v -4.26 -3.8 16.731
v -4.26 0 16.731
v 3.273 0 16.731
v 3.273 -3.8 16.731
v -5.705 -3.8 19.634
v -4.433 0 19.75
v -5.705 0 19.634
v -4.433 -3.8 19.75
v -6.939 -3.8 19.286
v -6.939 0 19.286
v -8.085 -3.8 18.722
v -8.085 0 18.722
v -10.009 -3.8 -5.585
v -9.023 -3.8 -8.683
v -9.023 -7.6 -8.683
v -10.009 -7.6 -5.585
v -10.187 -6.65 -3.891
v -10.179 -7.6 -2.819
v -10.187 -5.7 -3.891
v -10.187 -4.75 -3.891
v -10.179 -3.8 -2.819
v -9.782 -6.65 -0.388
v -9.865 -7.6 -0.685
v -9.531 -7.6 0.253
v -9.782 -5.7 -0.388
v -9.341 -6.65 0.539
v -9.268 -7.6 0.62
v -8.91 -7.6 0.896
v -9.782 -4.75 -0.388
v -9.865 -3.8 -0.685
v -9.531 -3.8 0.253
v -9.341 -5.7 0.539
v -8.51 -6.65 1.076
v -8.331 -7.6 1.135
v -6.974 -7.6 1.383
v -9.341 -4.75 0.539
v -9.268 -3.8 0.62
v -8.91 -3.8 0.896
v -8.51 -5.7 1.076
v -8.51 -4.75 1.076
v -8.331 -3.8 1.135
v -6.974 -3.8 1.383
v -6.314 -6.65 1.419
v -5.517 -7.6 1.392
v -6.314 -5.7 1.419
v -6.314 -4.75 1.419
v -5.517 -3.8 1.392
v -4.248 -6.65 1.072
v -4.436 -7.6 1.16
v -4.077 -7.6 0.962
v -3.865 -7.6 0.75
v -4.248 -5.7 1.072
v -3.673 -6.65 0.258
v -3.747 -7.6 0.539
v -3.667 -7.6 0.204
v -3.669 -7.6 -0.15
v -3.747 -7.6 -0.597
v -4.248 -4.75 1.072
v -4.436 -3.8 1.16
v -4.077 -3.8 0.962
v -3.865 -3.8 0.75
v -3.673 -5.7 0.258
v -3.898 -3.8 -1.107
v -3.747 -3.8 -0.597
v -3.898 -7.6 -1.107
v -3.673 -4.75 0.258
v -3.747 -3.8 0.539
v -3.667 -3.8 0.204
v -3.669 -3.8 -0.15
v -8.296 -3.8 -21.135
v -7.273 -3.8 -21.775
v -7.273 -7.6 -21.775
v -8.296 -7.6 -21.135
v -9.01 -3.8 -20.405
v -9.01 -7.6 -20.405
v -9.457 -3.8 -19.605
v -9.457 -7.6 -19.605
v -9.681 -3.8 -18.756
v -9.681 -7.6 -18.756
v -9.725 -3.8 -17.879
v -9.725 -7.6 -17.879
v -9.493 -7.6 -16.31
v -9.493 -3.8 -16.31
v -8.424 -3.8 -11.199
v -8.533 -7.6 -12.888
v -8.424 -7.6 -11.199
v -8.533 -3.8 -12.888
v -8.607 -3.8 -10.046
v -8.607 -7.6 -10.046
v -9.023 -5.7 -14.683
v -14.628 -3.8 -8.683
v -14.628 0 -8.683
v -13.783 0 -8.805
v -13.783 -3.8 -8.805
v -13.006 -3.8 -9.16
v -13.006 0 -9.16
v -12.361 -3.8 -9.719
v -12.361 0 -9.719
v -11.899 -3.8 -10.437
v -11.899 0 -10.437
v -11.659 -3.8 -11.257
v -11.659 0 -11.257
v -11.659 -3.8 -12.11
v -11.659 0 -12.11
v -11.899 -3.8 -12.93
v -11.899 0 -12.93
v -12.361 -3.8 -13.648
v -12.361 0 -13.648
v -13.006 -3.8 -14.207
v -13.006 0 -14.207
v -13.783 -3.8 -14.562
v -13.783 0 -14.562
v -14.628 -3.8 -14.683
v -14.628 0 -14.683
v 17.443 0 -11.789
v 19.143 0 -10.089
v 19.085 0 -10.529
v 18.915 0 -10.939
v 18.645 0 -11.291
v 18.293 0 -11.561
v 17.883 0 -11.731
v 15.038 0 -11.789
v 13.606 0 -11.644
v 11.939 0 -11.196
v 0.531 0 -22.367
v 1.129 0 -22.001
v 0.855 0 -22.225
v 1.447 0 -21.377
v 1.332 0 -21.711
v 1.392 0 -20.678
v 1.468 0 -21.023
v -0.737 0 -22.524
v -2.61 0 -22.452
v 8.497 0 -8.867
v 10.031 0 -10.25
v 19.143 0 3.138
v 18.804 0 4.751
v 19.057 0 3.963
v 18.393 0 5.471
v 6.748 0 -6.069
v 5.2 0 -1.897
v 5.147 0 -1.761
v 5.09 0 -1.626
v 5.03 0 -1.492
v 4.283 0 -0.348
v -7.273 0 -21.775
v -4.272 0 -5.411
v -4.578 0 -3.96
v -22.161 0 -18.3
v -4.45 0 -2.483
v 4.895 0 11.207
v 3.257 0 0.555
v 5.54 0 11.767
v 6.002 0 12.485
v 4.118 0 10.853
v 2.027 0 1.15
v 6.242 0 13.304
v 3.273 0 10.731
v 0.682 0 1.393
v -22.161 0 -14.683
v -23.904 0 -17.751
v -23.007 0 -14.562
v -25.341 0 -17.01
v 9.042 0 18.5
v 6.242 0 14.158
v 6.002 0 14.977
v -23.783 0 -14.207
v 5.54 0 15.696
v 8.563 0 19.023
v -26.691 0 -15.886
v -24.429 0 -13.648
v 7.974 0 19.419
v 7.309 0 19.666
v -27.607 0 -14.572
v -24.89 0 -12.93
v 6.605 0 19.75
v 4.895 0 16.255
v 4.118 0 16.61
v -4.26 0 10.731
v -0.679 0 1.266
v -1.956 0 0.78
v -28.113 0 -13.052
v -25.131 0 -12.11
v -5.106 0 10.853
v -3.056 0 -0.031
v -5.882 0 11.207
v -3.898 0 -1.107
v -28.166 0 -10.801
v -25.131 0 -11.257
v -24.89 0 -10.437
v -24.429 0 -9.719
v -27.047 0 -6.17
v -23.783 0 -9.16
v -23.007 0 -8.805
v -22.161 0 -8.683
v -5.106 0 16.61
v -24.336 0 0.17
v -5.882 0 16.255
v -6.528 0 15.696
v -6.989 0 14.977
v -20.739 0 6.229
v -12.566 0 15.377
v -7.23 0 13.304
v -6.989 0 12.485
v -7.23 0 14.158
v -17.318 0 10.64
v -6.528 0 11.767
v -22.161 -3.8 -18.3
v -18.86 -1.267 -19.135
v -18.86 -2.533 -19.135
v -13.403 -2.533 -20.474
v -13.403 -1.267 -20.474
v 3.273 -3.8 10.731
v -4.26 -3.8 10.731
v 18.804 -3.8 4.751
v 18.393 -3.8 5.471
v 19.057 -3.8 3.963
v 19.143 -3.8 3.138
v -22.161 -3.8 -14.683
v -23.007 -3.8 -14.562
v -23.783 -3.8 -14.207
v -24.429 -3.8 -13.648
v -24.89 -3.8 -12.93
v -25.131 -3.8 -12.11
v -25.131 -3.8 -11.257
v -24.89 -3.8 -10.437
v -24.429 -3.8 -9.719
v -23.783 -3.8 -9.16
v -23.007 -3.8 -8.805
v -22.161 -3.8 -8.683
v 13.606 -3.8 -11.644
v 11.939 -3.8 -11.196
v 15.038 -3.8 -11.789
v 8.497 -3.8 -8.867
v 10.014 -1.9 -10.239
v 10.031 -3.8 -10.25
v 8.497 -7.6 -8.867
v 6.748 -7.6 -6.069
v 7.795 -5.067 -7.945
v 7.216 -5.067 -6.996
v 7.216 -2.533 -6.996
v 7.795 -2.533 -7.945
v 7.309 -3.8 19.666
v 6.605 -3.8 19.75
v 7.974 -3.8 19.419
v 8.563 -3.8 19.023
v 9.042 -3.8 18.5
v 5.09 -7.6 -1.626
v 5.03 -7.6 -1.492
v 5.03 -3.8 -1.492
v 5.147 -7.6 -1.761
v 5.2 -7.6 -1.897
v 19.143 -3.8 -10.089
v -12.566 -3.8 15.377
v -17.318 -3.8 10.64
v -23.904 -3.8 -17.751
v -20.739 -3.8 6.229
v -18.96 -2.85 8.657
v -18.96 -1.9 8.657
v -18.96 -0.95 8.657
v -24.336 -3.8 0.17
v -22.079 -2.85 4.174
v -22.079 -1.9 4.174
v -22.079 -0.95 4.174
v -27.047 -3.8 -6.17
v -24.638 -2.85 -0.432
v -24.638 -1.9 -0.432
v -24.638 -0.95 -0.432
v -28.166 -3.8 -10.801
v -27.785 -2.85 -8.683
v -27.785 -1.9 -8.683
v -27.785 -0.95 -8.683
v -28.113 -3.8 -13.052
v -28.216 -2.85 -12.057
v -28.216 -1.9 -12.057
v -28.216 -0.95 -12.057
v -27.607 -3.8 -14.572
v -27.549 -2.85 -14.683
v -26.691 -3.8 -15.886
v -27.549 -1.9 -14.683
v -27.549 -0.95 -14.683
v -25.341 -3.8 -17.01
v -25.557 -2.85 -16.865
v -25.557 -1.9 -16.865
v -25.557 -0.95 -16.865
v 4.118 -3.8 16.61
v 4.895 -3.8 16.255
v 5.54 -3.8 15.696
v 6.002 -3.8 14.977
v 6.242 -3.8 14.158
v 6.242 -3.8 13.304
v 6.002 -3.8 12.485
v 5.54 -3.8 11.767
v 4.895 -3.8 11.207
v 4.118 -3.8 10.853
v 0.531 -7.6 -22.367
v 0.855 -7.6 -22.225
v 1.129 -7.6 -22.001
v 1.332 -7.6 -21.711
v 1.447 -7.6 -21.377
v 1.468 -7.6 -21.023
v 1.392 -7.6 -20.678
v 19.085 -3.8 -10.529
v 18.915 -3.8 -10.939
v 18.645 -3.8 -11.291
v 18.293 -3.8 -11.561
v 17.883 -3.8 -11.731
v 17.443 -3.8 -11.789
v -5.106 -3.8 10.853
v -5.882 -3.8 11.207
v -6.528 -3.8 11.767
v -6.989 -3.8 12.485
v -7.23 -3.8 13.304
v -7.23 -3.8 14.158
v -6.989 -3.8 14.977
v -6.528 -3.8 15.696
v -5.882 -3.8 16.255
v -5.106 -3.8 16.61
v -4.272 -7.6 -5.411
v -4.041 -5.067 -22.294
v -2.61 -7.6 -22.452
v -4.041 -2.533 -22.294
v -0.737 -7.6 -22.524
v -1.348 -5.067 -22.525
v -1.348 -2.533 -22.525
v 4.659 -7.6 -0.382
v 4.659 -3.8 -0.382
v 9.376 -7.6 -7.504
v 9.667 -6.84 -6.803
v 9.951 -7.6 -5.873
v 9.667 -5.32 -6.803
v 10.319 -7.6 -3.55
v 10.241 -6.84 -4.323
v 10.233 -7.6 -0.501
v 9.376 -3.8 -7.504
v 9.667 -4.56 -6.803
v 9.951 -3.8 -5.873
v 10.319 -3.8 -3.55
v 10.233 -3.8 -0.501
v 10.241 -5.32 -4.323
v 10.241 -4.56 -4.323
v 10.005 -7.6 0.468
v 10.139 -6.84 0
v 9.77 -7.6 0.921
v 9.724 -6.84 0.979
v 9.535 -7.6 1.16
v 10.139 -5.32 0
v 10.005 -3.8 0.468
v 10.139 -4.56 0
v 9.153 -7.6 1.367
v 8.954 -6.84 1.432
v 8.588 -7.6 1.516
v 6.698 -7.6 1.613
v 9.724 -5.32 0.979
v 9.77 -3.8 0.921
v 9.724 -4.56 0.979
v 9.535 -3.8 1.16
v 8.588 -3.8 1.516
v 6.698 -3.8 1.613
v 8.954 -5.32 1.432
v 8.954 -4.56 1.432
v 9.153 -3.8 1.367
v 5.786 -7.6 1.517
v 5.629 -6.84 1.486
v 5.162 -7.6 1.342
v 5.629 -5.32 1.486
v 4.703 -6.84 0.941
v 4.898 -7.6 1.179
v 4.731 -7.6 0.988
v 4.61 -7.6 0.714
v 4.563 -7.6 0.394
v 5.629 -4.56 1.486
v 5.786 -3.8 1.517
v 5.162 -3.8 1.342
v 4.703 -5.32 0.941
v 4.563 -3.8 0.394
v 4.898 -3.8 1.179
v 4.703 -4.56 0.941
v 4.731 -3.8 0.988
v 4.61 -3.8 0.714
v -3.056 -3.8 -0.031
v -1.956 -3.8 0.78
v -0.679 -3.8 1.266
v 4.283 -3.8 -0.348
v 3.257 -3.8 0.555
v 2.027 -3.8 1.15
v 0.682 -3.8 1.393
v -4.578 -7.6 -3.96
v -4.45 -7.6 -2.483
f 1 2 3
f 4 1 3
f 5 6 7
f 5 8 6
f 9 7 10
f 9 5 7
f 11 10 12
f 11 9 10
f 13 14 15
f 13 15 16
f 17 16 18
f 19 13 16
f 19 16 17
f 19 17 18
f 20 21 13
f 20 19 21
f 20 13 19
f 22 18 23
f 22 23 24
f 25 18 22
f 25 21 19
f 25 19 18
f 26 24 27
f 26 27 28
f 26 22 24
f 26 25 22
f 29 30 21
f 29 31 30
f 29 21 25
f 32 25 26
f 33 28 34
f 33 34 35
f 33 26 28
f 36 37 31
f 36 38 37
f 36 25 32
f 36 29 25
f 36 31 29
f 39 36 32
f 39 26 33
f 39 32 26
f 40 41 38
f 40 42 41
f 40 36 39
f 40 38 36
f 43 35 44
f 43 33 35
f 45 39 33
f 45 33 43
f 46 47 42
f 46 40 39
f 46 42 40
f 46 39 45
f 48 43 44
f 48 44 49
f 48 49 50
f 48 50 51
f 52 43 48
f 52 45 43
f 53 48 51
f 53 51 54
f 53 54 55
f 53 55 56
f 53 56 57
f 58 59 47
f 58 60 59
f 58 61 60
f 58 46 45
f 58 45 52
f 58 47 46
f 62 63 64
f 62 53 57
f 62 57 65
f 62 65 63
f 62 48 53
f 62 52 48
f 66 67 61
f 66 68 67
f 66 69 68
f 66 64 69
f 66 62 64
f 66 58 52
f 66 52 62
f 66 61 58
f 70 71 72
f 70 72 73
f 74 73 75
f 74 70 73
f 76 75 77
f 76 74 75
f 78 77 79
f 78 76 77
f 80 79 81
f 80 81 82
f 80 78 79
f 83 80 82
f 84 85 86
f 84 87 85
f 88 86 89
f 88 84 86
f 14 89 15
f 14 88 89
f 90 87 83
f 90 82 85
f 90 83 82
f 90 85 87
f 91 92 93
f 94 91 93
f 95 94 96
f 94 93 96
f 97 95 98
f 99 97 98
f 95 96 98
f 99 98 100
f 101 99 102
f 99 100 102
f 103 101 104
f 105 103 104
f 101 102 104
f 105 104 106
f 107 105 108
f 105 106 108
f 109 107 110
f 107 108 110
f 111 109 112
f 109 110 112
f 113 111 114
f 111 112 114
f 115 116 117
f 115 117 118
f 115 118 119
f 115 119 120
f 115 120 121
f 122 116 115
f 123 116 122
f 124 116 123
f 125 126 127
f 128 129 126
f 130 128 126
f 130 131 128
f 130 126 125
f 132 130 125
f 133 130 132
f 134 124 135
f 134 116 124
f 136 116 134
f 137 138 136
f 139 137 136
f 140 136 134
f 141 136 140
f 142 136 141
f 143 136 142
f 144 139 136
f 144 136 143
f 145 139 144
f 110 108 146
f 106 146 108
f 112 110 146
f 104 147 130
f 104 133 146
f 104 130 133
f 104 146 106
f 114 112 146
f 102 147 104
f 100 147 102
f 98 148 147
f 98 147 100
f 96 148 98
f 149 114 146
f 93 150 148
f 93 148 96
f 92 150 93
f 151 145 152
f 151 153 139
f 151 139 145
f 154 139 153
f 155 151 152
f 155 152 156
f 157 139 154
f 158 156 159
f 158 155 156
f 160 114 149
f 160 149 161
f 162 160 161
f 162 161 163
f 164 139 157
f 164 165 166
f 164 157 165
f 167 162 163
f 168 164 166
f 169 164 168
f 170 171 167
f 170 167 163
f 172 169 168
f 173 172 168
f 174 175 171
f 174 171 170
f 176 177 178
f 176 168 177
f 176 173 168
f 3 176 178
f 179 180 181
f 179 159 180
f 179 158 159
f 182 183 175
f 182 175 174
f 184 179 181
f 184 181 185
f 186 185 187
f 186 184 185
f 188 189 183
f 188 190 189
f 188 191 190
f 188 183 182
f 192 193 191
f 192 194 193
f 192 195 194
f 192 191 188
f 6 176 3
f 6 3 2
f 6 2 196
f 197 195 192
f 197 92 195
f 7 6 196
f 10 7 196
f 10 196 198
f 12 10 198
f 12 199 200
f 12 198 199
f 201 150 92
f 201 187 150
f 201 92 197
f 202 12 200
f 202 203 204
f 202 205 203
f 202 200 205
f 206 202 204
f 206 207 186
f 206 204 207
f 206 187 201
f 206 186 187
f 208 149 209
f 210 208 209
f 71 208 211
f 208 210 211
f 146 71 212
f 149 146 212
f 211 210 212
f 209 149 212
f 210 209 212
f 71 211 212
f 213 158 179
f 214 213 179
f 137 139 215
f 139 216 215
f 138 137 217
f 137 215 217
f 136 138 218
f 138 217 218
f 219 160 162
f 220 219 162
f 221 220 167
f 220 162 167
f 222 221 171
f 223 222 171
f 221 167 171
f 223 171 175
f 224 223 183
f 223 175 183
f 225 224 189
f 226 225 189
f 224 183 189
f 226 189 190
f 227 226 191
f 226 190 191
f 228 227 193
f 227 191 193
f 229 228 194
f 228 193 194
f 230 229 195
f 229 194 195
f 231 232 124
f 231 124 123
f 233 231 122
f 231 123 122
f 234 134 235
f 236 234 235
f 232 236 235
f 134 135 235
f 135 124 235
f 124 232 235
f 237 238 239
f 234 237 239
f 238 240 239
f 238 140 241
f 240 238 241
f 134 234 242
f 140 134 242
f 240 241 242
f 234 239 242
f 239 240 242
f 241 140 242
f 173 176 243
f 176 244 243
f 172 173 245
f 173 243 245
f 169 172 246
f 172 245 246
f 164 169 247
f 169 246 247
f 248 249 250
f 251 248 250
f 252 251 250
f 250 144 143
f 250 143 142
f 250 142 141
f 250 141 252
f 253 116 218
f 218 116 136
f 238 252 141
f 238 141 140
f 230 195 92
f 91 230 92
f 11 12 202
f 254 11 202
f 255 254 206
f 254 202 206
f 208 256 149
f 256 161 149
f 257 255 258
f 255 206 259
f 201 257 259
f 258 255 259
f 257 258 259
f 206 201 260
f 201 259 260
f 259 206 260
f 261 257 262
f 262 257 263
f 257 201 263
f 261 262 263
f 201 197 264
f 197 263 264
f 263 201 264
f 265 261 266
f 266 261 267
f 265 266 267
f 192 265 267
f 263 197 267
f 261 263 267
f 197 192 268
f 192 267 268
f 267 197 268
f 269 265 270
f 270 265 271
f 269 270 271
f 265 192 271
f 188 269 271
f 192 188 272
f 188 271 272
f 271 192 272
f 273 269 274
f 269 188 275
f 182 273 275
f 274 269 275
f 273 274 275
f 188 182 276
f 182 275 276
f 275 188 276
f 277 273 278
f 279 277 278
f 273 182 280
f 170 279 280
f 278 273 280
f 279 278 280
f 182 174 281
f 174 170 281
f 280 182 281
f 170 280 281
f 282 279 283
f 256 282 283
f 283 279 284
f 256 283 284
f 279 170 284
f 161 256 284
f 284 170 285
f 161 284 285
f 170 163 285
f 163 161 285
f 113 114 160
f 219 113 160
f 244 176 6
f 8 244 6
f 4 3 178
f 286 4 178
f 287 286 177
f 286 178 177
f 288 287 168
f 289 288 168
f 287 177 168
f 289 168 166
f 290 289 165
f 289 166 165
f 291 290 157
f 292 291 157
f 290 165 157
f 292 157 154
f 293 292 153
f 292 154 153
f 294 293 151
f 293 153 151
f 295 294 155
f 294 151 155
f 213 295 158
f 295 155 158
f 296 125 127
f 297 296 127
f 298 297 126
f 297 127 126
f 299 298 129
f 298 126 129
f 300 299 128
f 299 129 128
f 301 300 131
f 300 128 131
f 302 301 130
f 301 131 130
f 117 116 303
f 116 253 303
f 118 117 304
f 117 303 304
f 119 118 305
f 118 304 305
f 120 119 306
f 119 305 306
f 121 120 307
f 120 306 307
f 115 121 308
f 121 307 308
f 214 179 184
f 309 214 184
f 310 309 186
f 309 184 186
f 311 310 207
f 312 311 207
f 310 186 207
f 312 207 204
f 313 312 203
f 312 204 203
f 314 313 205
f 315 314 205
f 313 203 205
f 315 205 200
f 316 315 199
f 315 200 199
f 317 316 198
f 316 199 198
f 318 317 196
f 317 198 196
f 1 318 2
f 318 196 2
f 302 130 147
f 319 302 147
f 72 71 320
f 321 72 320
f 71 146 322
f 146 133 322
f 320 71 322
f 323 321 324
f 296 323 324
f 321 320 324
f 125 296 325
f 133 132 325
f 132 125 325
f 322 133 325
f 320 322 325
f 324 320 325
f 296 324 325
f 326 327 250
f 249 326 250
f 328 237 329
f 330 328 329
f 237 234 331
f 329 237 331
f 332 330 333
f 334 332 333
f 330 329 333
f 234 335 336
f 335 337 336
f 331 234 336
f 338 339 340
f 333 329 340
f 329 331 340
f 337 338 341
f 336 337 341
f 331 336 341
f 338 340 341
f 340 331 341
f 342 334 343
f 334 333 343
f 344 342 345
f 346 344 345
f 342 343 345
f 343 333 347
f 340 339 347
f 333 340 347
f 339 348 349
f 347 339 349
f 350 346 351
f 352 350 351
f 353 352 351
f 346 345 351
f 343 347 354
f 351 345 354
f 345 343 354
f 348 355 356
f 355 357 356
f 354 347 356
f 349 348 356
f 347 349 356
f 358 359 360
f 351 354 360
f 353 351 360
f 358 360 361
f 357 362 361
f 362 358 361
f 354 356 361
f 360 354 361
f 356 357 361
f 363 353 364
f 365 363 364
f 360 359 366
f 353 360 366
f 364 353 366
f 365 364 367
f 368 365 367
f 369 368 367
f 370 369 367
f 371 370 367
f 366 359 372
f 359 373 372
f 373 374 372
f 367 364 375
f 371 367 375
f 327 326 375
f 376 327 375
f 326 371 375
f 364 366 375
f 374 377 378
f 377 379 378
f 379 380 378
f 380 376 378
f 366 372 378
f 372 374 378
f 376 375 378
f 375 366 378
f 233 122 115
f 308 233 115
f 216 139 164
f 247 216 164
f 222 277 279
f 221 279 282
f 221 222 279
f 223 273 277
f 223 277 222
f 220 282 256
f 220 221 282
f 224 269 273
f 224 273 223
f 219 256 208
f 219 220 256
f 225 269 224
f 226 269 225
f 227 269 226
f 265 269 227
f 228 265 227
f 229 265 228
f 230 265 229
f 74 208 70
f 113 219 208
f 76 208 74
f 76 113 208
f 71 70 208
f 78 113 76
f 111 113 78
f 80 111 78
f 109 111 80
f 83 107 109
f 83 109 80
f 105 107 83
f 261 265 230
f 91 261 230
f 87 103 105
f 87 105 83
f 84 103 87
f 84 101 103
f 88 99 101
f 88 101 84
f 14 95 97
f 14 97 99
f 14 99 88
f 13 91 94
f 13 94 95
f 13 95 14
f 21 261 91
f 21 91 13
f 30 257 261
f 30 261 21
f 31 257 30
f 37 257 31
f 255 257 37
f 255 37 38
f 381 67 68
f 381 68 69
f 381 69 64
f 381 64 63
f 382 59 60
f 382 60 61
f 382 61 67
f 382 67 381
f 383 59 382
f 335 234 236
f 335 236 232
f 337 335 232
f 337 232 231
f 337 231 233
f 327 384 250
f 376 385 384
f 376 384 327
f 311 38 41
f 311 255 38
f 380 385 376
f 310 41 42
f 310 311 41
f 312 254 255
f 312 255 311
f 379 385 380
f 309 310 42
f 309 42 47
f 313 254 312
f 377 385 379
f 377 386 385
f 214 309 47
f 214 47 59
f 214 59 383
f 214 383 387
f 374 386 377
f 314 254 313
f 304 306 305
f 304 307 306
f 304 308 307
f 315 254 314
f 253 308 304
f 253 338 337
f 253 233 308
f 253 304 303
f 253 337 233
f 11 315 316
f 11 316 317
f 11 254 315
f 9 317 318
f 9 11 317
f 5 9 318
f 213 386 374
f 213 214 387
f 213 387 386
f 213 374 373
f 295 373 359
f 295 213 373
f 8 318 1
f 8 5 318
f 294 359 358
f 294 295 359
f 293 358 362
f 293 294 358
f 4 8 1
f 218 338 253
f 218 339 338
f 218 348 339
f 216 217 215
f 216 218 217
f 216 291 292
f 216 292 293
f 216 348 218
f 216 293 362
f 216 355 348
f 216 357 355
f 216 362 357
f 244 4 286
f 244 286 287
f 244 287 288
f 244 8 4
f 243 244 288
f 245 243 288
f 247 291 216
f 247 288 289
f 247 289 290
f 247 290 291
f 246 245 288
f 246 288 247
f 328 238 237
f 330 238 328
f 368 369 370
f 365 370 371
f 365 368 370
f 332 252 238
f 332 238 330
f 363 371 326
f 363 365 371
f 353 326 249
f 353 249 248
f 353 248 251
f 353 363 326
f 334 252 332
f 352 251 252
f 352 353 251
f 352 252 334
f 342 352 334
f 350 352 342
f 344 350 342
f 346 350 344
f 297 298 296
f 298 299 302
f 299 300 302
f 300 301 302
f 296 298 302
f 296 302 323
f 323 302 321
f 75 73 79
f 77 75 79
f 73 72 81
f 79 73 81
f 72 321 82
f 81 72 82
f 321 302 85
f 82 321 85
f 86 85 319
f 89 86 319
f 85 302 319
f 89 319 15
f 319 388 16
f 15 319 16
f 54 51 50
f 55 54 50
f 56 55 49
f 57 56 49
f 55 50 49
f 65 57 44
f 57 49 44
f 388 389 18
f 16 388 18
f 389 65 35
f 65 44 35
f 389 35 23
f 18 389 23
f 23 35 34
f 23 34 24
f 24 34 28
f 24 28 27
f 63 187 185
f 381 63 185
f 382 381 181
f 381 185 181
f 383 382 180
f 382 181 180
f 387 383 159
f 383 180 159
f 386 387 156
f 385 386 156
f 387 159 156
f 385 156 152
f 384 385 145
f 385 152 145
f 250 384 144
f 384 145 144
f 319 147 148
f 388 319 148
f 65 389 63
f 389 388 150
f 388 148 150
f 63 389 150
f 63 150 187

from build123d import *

# Parameters (mm, degrees)
F1_DEPTH = 3.8
F2_DEPTH = 7.6
F3_R     = 7
F4_R     = 3
F5_R     = 4
F6_R     = 1.7


with BuildPart() as f1:
    # F0 (on Front) → F1 (new body)
    with BuildSketch(Plane.XZ):
        with BuildLine():
            Line((19.1431716898, 4.4253403938), (8.1440456616, 19.750261103))
            Line((8.1440456616, 19.750261103), (-6.1453692615, 19.750261103))
            add(Edge.make_bspline(
                [(-6.1453692615, 19.750261103), (-9.4334975883, 18.3276780648), (-20.4694799737, 9.4077816301), (-28.441204782, -7.9211202874), (-28.3713925064, -15.033986271), (-24.9090821352, -17.6588842502), (-22.1613161266, -18.3001520287)],
                knots=[0, 0, 0, 0, 0.3043807241, 0.630499808, 0.8116691041, 1, 1, 1, 1], degree=3))
            add(Edge.make_bspline(
                [(-22.1613161266, -18.3001520287), (-20.4320557503, -18.7037231321), (-13.2463438928, -20.672034694), (-7.2728786379, -21.7751605126)],
                knots=[0, 0, 0, 0, 14.676670933, 14.676670933, 14.676670933, 14.676670933], degree=3))
            add(Edge.make_bspline(
                [(-7.2728786379, -21.7751605126), (-10.7580149359, -20.0565494265), (-8.7832123206, -14.063103822), (-8.03378309, -11.3945532964), (-9.0233562514, -8.6834942922)],
                knots=[0, 0, 0, 0, 0.5245717937, 1, 1, 1, 1], degree=3))
            add(Edge.make_bspline(
                [(-9.0233562514, -8.6834942922), (-10.6191516402, -5.3268720907), (-10.1119981872, -0.4332128436), (-8.8609410373, 1.4029428946), (-3.6260034076, 1.6703835883), (-3.5176839858, 0), (-3.8980361515, -1.1065827018)],
                knots=[0, 0, 0, 0, 0.3686579414, 0.5465668413, 0.8102724675, 1, 1, 1, 1], degree=3))
            ThreePointArc((-3.8980361515, -1.1065827018), (0.6821136218, 1.3926973088), (5.0296685697, -1.4922530361))
            add(Edge.make_bspline(
                [(8.4968951944, -8.8667105614), (10.512974474, -6.6020334922), (10.6178822415, 0.1333355699), (9.2147437469, 1.7017312358), (5.6166367294, 1.6619292411), (4.4507364715, 0.9827180402), (4.4928646091, -0.16227164), (5.0296685697, -1.4922530361)],
                knots=[0, 0, 0, 0, 0.3364900582, 0.4892530829, 0.6935980051, 0.8097848409, 0.9832063696, 0.9832063696, 0.9832063696, 0.9832063696], degree=3))
            add(Edge.make_bspline(
                [(8.4968951944, -8.8667105614), (8.93450925, -9.375769436), (10.8149022533, -11.1384536985), (13.7340780615, -11.7891050671), (15.0382904123, -11.7891050671)],
                knots=[0.3188114686, 0.3188114686, 0.3188114686, 0.3188114686, 0.5009211334, 1, 1, 1, 1], degree=3))
            Line((15.0382904123, -11.7891050671), (19.1431716898, -11.7891050671))
            Line((19.1431716898, -11.7891050671), (19.1431716898, 4.4253403938))
        make_face()
        with BuildLine():
            ThreePointArc((-22.1613161266, -14.6834942922), (-25.1613161266, -11.6834942922), (-22.1613161266, -8.6834942922))
            Line((-22.1613161266, -8.6834942922), (-14.628011294, -8.6834942922))
            ThreePointArc((-14.628011294, -8.6834942922), (-11.628011294, -11.6834942922), (-14.628011294, -14.6834942922))
            Line((-14.628011294, -14.6834942922), (-22.1613161266, -14.6834942922))
        make_face(mode=Mode.SUBTRACT)
        with BuildLine():
            ThreePointArc((3.2729445693, 16.7312547565), (6.2729445693, 13.7312547565), (3.2729445693, 10.7312547565))
            Line((3.2729445693, 10.7312547565), (-4.2603602633, 10.7312547565))
            ThreePointArc((-4.2603602633, 10.7312547565), (-7.2603602633, 13.7312547565), (-4.2603602633, 16.7312547565))
            Line((-4.2603602633, 16.7312547565), (3.2729445693, 16.7312547565))
        make_face(mode=Mode.SUBTRACT)
    extrude(amount=F1_DEPTH)

    # F0 (on Front) → F2 (join)
    with BuildSketch(Plane.XZ):
        with BuildLine():
            add(Edge.make_bspline(
                [(-7.2728786379, -21.7751605126), (-10.7580149359, -20.0565494265), (-8.7832123206, -14.063103822), (-8.03378309, -11.3945532964), (-9.0233562514, -8.6834942922)],
                knots=[0, 0, 0, 0, 0.5245717937, 1, 1, 1, 1], degree=3))
            add(Edge.make_bspline(
                [(-7.2728786379, -21.7751605126), (-3.8634845801, -22.4047767321), (-0.848995576, -22.7525474742), (0.5306684761, -22.3666733306)],
                knots=[14.676670933, 14.676670933, 14.676670933, 14.676670933, 23.053476109, 23.053476109, 23.053476109, 23.053476109], degree=3))
            ThreePointArc((0.5306684761, -22.3666733306), (1.3315647917, -21.7109648486), (1.3916492908, -20.6776312264))
            Line((1.3916492908, -20.6776312264), (-4.2720503639, -5.4112309833))
            ThreePointArc((-4.2720503639, -5.4112309833), (-4.5685146727, -3.2168998843), (-3.8980361515, -1.1065827018))
            add(Edge.make_bspline(
                [(-9.0233562514, -8.6834942922), (-10.6191516402, -5.3268720907), (-10.1119981872, -0.4332128436), (-8.8609410373, 1.4029428946), (-3.6260034076, 1.6703835883), (-3.5176839858, 0), (-3.8980361515, -1.1065827018)],
                knots=[0, 0, 0, 0, 0.3686579414, 0.5465668413, 0.8102724675, 1, 1, 1, 1], degree=3))
        make_face()
        with BuildLine():
            add(Edge.make_bspline(
                [(6.7479446556, -6.068916612), (7.1641658841, -6.9684223917), (7.730783303, -7.9755233328), (8.4968951944, -8.8667105614)],
                knots=[0, 0, 0, 0, 0.3188114686, 0.3188114686, 0.3188114686, 0.3188114686], degree=3))
            add(Edge.make_bspline(
                [(8.4968951944, -8.8667105614), (10.512974474, -6.6020334922), (10.6178822415, 0.1333355699), (9.2147437469, 1.7017312358), (5.6166367294, 1.6619292411), (4.4507364715, 0.9827180402), (4.4928646091, -0.16227164), (5.0296685697, -1.4922530361)],
                knots=[0, 0, 0, 0, 0.3364900582, 0.4892530829, 0.6935980051, 0.8097848409, 0.9832063696, 0.9832063696, 0.9832063696, 0.9832063696], degree=3))
            ThreePointArc((5.0296685697, -1.4922530361), (5.1193553392, -1.6928196399), (5.2002361796, -1.8970963366))
            Line((5.2002361796, -1.8970963366), (6.7479446556, -6.068916612))
        make_face()
    extrude(amount=F2_DEPTH)

    # F3
    f3_edges = [f1.edges().sort_by_distance(p)[0] for p in [
        (-6.145369, -1.9, 19.750261),
    ]]
    fillet(f3_edges, radius=F3_R)

    # F4
    f4_edges = [f1.edges().sort_by_distance(p)[0] for p in [
        (8.144046, -1.9, 19.750261),
    ]]
    fillet(f4_edges, radius=F4_R)

    # F5
    f5_edges = [f1.edges().sort_by_distance(p)[0] for p in [
        (19.143172, -1.9, 4.42534),
    ]]
    fillet(f5_edges, radius=F5_R)

    # F6
    f6_edges = [f1.edges().sort_by_distance(p)[0] for p in [
        (19.143172, -1.9, -11.789105),
    ]]
    fillet(f6_edges, radius=F6_R)


solid = f1.part
